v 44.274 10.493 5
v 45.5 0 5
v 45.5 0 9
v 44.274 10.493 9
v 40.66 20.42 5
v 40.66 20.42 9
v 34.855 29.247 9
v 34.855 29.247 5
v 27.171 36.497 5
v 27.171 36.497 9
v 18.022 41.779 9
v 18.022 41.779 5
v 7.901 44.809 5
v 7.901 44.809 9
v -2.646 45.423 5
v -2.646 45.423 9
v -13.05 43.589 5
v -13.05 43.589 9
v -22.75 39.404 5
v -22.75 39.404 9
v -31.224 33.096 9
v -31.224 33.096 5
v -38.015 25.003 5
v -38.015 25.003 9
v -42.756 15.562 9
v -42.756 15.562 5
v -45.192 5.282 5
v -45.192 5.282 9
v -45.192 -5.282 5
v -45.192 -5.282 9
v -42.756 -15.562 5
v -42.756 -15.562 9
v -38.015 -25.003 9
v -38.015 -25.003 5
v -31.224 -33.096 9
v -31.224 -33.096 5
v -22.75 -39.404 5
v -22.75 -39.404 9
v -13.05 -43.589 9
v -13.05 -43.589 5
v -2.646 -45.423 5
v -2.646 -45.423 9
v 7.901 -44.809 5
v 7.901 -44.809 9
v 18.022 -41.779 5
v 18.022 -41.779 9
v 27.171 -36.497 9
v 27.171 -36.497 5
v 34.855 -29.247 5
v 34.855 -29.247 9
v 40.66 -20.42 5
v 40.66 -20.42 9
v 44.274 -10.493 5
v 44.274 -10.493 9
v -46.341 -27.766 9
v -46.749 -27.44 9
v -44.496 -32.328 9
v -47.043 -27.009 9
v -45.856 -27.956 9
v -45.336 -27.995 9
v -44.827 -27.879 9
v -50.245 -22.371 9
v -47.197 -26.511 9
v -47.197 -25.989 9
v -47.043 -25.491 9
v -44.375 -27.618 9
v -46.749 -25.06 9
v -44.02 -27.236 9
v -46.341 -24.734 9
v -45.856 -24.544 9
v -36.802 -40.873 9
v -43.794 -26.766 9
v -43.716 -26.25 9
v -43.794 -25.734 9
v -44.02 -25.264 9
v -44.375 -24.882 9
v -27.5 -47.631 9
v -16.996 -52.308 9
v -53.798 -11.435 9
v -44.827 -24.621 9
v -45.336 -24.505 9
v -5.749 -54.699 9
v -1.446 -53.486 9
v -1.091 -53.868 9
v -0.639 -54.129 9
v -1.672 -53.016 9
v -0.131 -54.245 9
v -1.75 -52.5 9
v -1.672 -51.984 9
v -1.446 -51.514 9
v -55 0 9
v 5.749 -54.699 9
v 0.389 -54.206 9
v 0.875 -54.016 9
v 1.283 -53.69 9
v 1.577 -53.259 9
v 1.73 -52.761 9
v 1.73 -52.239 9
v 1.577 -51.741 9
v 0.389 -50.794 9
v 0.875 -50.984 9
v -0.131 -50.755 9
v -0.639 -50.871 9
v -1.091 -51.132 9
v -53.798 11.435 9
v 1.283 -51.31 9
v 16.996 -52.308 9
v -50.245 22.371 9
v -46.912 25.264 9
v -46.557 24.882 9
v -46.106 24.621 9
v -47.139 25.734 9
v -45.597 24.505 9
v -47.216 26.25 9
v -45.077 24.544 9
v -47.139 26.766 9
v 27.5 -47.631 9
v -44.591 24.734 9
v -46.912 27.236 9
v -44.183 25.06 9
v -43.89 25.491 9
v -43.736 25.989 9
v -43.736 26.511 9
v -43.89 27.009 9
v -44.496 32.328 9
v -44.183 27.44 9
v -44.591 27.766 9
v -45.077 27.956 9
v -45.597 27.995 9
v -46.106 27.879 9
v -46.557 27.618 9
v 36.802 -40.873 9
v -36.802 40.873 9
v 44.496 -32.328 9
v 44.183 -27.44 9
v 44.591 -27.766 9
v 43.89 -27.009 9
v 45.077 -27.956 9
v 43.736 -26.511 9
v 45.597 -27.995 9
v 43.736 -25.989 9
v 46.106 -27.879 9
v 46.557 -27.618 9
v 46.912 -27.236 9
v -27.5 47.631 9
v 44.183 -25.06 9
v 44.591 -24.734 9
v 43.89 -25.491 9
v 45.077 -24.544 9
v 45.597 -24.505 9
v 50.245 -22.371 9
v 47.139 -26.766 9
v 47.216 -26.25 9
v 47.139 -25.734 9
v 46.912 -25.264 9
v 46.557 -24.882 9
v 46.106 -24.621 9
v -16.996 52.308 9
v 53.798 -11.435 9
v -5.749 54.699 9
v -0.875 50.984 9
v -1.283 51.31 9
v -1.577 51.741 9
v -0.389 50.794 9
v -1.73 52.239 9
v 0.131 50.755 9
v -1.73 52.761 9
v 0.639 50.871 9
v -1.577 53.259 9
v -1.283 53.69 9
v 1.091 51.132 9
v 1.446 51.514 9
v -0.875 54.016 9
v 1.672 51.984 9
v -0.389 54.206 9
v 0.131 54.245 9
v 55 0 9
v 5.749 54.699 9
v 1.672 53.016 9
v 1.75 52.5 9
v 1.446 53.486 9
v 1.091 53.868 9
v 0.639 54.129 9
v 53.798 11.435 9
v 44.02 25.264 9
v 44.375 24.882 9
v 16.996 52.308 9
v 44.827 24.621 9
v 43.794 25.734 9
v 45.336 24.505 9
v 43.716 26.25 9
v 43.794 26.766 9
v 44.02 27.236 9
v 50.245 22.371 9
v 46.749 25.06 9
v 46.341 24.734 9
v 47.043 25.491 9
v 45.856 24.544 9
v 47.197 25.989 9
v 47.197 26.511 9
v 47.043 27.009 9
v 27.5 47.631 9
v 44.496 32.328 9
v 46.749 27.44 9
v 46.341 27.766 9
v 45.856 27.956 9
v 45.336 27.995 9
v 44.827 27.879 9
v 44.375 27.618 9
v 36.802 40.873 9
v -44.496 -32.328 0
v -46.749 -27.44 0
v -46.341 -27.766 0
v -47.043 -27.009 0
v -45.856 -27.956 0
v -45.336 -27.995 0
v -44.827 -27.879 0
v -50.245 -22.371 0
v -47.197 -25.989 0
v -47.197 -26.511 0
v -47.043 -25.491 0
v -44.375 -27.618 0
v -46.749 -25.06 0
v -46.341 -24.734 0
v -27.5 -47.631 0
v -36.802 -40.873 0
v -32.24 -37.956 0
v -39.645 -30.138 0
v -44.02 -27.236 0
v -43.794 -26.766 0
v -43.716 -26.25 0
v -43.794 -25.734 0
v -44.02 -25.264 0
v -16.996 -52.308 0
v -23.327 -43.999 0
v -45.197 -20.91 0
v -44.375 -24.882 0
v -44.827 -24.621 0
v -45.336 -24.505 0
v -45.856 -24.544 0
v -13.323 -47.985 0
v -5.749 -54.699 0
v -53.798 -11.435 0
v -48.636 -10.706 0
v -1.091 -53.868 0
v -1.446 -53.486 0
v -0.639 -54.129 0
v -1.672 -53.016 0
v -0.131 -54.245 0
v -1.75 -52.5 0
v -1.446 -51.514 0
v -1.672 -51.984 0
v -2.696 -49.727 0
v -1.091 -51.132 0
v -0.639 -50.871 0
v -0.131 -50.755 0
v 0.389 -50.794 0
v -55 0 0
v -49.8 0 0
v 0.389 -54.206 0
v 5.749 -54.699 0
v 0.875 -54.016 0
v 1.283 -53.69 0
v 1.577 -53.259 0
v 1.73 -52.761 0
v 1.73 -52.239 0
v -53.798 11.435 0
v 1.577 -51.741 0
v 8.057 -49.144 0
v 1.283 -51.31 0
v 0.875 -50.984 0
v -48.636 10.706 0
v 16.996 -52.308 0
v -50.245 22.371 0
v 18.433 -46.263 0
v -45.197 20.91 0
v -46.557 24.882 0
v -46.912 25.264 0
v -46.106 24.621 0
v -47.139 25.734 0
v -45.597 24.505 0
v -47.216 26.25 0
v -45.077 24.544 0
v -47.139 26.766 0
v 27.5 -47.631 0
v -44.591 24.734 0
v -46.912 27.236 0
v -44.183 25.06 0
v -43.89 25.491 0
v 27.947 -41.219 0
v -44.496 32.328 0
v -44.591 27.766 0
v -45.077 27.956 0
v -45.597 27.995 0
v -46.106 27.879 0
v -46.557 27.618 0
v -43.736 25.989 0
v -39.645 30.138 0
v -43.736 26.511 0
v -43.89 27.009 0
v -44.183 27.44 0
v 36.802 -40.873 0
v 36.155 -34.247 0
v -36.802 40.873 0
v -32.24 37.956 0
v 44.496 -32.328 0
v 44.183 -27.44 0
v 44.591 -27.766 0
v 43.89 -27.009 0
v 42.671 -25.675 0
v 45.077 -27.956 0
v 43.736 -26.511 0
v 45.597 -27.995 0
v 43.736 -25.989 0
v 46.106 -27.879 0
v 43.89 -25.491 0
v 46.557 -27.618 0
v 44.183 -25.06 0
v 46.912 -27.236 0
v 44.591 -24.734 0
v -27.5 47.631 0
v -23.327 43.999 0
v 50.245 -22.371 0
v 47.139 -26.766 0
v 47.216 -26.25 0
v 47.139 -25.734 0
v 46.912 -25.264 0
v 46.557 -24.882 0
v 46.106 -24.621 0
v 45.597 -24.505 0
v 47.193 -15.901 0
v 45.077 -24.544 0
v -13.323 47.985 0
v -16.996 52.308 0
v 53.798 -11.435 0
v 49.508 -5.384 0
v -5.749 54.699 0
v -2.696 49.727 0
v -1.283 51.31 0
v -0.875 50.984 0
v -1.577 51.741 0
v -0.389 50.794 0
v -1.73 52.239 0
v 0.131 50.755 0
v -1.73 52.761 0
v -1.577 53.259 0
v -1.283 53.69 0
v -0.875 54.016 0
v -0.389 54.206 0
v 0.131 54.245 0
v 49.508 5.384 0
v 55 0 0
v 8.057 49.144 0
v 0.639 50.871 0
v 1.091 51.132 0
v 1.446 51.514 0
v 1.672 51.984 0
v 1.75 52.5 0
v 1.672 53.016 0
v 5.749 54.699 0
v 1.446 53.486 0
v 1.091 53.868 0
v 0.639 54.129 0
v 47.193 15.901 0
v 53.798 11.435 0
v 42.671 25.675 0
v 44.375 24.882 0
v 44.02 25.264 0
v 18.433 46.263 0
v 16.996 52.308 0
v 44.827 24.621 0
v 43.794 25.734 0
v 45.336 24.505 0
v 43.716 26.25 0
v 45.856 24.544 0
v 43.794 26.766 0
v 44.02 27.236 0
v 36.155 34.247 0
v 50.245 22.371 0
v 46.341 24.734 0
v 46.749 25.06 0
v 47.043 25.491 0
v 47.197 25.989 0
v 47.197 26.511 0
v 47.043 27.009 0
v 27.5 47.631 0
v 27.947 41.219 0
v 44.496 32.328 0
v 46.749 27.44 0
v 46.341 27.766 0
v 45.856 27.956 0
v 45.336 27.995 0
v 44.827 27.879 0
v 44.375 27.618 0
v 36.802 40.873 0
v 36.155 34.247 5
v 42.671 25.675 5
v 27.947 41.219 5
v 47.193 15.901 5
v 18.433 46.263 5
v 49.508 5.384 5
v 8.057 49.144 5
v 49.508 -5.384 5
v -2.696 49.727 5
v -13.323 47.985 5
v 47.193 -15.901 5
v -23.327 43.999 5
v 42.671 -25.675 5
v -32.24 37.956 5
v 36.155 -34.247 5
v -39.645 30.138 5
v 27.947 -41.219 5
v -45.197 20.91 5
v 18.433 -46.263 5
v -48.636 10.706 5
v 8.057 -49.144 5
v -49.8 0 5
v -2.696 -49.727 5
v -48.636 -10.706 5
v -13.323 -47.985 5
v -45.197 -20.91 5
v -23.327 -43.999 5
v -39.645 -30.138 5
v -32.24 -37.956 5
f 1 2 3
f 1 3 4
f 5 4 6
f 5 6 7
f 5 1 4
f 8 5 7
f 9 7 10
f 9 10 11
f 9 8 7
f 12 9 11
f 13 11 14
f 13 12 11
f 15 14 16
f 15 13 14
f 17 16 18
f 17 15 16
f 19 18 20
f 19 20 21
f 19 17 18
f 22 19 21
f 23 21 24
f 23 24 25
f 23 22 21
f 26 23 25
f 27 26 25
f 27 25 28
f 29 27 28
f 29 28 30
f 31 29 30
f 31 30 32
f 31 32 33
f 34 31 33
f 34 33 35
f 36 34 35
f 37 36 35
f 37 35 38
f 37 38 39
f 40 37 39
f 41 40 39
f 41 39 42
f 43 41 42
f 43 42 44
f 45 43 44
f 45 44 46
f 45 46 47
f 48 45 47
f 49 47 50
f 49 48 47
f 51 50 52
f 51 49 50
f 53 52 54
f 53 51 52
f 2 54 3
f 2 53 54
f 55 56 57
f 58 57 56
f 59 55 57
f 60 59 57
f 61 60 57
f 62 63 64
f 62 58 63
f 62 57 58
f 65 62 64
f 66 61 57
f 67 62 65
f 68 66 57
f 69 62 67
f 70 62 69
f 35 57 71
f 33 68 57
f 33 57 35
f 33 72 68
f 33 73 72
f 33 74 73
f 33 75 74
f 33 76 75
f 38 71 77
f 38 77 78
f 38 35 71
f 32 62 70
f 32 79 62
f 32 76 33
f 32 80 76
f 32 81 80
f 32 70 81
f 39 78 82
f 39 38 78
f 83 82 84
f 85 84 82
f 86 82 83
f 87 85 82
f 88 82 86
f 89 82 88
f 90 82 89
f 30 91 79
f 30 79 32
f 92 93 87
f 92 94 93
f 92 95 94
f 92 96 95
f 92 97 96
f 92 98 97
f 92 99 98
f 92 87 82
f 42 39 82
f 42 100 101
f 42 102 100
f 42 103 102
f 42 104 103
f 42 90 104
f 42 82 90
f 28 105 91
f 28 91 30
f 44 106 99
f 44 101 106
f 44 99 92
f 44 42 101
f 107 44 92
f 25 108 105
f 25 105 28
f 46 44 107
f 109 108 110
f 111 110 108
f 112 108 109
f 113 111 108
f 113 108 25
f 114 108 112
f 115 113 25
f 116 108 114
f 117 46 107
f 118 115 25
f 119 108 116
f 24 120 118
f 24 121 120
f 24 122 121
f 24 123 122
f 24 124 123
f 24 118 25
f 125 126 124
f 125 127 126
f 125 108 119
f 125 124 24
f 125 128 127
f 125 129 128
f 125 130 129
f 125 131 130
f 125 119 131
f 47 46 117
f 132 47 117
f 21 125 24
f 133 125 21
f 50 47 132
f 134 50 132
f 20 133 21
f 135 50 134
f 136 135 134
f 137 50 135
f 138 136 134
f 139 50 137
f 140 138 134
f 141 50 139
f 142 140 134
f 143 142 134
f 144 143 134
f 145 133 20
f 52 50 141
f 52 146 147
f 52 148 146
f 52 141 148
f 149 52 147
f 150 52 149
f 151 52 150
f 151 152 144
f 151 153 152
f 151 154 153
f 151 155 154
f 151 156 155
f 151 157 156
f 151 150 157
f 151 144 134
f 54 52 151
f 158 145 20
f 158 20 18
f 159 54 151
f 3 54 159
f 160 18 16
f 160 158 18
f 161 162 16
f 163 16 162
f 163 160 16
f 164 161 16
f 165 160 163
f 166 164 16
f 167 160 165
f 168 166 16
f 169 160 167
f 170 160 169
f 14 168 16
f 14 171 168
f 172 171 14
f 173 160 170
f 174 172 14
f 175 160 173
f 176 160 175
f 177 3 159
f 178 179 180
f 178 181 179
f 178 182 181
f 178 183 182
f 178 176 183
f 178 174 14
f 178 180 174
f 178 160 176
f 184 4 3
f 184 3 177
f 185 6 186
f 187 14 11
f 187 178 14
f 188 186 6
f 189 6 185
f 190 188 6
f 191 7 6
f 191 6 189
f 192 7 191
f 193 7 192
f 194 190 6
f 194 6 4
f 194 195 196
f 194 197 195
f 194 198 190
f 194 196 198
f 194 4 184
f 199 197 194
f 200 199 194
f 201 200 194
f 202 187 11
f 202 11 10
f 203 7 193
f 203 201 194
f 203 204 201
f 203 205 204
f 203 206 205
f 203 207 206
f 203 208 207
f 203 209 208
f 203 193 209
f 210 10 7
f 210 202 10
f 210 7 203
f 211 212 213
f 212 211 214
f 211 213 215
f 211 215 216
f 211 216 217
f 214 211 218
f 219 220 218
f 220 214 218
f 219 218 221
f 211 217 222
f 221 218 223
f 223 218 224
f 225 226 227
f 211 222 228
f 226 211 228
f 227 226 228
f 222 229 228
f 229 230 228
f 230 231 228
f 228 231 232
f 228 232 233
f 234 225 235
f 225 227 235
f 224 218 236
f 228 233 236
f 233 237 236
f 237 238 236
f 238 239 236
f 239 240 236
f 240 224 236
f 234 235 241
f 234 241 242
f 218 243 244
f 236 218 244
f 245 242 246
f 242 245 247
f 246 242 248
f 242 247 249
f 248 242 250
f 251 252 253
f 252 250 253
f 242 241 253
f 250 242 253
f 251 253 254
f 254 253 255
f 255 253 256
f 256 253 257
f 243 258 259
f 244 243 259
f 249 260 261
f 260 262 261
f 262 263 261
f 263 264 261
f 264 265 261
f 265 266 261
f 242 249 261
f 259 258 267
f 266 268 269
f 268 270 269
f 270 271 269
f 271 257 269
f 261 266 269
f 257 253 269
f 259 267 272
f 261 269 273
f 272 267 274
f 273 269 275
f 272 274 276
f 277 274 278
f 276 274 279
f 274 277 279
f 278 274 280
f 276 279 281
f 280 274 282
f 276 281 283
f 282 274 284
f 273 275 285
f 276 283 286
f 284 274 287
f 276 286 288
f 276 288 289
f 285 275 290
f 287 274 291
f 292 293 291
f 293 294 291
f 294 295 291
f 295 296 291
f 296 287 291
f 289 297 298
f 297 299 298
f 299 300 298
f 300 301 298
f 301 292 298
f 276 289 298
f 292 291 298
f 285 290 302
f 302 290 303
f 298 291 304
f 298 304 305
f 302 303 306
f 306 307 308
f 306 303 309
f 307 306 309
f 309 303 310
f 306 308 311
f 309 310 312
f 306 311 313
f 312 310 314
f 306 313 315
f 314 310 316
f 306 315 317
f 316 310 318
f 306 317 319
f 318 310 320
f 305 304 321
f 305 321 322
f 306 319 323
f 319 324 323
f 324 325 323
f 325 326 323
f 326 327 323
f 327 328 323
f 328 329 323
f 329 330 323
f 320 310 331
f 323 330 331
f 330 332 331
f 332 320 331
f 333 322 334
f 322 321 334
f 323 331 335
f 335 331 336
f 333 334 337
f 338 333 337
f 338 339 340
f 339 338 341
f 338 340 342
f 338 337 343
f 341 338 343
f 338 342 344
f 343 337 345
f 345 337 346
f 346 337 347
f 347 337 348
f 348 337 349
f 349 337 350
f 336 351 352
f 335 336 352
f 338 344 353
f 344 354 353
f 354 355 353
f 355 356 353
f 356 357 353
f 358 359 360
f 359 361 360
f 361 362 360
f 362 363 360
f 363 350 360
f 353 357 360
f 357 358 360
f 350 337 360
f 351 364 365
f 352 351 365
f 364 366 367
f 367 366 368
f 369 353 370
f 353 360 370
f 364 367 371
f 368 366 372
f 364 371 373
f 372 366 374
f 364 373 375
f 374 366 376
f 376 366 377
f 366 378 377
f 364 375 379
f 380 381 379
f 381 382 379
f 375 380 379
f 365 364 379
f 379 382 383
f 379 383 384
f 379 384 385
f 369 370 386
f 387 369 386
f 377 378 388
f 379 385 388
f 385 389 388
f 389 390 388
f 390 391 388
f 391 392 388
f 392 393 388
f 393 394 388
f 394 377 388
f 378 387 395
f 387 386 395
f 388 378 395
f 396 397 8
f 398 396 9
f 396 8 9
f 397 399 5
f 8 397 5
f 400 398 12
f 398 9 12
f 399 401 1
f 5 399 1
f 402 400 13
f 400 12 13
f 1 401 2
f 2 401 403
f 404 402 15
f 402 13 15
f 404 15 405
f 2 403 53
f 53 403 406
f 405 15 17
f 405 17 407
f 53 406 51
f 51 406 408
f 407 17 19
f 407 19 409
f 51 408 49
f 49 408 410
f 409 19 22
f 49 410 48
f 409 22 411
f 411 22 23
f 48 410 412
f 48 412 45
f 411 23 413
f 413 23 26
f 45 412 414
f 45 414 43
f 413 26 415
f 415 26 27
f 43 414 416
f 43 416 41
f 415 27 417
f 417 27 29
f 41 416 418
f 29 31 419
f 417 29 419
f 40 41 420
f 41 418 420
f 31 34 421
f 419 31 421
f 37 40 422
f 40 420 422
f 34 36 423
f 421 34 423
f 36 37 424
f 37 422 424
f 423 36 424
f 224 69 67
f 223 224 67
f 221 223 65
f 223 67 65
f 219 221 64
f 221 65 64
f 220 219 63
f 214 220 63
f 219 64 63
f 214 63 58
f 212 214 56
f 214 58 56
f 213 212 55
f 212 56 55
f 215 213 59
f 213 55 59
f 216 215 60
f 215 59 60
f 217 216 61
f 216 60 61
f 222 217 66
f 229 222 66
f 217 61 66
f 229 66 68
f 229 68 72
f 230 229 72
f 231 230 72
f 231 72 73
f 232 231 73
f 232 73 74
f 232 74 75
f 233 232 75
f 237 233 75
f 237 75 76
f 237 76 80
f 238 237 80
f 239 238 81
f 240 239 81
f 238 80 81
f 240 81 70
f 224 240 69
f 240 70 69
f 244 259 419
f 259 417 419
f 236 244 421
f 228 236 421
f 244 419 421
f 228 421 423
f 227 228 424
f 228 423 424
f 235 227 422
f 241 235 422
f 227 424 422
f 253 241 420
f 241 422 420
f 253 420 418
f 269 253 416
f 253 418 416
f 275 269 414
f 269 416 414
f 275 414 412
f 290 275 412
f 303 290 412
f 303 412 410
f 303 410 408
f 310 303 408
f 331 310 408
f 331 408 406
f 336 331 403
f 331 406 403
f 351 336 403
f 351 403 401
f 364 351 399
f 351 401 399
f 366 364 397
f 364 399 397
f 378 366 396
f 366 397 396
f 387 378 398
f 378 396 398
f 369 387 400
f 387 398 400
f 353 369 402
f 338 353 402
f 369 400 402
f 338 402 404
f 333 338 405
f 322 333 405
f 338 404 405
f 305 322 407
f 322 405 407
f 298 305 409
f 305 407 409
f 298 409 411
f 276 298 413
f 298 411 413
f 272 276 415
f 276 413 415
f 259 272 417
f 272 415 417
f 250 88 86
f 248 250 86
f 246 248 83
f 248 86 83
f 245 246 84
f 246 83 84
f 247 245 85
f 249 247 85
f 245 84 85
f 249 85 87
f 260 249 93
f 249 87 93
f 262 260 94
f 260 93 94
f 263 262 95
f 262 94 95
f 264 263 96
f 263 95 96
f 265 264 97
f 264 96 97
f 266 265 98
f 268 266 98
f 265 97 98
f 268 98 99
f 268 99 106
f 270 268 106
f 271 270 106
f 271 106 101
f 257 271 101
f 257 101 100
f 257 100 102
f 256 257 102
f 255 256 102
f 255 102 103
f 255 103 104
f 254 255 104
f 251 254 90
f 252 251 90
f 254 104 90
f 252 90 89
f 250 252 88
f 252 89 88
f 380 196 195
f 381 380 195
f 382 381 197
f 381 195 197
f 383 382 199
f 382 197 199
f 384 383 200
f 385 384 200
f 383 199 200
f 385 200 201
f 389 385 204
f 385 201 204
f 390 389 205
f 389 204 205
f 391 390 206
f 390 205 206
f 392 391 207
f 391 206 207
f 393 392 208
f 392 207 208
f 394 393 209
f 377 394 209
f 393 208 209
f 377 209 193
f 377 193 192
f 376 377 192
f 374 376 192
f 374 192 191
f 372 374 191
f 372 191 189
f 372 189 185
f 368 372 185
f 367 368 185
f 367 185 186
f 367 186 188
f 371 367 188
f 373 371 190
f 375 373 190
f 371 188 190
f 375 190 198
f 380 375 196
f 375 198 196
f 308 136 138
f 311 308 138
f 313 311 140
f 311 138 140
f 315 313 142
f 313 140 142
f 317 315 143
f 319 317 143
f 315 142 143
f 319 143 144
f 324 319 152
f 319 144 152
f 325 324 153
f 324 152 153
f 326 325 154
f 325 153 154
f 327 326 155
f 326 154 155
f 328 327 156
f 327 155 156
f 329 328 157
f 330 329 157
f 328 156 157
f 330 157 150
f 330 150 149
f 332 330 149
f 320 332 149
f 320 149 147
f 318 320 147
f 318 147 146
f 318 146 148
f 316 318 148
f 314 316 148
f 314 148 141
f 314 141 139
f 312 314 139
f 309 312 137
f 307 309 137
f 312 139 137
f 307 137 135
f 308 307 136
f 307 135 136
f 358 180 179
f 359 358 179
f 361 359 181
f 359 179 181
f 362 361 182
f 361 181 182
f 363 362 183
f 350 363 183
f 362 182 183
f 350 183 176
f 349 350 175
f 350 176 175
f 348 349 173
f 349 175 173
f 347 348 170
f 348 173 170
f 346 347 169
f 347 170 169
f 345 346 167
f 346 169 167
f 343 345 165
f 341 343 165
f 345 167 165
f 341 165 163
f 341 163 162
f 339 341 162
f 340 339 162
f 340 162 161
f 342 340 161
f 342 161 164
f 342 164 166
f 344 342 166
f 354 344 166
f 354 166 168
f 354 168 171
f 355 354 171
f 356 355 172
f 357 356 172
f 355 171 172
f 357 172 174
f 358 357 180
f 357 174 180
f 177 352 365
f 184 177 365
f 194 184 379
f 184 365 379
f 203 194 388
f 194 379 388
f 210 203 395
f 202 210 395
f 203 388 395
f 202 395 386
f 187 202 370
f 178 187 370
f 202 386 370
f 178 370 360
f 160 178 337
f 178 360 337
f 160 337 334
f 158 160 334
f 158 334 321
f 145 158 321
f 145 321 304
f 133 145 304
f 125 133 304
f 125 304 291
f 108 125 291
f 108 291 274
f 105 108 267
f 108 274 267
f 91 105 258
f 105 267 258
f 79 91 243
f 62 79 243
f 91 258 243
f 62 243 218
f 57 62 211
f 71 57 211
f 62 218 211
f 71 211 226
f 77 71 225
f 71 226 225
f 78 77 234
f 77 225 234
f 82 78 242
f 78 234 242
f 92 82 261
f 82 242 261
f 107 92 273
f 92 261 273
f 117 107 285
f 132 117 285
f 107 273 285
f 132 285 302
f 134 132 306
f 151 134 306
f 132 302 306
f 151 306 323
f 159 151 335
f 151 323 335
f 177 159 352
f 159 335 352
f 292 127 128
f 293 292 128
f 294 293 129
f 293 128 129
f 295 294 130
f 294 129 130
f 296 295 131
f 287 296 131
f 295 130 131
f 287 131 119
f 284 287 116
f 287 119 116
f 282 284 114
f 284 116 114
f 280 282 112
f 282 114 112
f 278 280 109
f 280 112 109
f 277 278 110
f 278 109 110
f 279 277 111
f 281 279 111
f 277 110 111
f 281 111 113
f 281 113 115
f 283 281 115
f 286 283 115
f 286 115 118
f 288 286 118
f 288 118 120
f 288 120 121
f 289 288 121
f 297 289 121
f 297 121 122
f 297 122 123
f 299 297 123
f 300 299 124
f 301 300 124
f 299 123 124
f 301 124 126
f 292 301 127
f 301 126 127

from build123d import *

# Parameters (mm, degrees)
SKETCH_1_R               = 55
SKETCH_1_R_2             = 45.5
EXTRUDE_1_DEPTH          = 9
SKETCH_2_R               = 1.75
CUT_EXTRUDE_1_DEPTH      = 9
PATTERN_CIRCULAR_1_COUNT = 6


with BuildPart() as part:
    # 草图1 → 凸台-拉伸1 (new body)
    with BuildSketch(Plane.XY):
        Circle(SKETCH_1_R)
        Circle(SKETCH_1_R_2, mode=Mode.SUBTRACT)
    extrude(amount=EXTRUDE_1_DEPTH)

    # 草图2 → 切除-拉伸1 (cut)
    with BuildSketch(Plane.XY.offset(9)):
        with Locations((0, 52.5)):
            Circle(SKETCH_2_R)
    cut_extrude_1 = extrude(amount=-CUT_EXTRUDE_1_DEPTH, mode=Mode.SUBTRACT)

    # 阵列(圆周)1: 切除-拉伸1 ×6 about axis
    pattern_circular_1_axis = Axis((0, 0, 0), (0, 0, 1))
    for i in range(1, PATTERN_CIRCULAR_1_COUNT):
        add(cut_extrude_1.rotate(pattern_circular_1_axis, i * 360 / PATTERN_CIRCULAR_1_COUNT), mode=Mode.SUBTRACT)

    # 草图3 → 切除-旋转1 (revolve, cut)
    with BuildSketch(Plane(origin=(0, 0, 0), x_dir=(1, 0, 0), z_dir=(0, 1, 0))):
        Polygon((-49.8, 0), (-49.8, -5), (-46.83072822, -5), (-45.5, -5), (-45.5, 0), align=None)
    revolve(axis=Axis((0, 0, 0), (0, 0, 1)), mode=Mode.SUBTRACT)


solid = part.part
